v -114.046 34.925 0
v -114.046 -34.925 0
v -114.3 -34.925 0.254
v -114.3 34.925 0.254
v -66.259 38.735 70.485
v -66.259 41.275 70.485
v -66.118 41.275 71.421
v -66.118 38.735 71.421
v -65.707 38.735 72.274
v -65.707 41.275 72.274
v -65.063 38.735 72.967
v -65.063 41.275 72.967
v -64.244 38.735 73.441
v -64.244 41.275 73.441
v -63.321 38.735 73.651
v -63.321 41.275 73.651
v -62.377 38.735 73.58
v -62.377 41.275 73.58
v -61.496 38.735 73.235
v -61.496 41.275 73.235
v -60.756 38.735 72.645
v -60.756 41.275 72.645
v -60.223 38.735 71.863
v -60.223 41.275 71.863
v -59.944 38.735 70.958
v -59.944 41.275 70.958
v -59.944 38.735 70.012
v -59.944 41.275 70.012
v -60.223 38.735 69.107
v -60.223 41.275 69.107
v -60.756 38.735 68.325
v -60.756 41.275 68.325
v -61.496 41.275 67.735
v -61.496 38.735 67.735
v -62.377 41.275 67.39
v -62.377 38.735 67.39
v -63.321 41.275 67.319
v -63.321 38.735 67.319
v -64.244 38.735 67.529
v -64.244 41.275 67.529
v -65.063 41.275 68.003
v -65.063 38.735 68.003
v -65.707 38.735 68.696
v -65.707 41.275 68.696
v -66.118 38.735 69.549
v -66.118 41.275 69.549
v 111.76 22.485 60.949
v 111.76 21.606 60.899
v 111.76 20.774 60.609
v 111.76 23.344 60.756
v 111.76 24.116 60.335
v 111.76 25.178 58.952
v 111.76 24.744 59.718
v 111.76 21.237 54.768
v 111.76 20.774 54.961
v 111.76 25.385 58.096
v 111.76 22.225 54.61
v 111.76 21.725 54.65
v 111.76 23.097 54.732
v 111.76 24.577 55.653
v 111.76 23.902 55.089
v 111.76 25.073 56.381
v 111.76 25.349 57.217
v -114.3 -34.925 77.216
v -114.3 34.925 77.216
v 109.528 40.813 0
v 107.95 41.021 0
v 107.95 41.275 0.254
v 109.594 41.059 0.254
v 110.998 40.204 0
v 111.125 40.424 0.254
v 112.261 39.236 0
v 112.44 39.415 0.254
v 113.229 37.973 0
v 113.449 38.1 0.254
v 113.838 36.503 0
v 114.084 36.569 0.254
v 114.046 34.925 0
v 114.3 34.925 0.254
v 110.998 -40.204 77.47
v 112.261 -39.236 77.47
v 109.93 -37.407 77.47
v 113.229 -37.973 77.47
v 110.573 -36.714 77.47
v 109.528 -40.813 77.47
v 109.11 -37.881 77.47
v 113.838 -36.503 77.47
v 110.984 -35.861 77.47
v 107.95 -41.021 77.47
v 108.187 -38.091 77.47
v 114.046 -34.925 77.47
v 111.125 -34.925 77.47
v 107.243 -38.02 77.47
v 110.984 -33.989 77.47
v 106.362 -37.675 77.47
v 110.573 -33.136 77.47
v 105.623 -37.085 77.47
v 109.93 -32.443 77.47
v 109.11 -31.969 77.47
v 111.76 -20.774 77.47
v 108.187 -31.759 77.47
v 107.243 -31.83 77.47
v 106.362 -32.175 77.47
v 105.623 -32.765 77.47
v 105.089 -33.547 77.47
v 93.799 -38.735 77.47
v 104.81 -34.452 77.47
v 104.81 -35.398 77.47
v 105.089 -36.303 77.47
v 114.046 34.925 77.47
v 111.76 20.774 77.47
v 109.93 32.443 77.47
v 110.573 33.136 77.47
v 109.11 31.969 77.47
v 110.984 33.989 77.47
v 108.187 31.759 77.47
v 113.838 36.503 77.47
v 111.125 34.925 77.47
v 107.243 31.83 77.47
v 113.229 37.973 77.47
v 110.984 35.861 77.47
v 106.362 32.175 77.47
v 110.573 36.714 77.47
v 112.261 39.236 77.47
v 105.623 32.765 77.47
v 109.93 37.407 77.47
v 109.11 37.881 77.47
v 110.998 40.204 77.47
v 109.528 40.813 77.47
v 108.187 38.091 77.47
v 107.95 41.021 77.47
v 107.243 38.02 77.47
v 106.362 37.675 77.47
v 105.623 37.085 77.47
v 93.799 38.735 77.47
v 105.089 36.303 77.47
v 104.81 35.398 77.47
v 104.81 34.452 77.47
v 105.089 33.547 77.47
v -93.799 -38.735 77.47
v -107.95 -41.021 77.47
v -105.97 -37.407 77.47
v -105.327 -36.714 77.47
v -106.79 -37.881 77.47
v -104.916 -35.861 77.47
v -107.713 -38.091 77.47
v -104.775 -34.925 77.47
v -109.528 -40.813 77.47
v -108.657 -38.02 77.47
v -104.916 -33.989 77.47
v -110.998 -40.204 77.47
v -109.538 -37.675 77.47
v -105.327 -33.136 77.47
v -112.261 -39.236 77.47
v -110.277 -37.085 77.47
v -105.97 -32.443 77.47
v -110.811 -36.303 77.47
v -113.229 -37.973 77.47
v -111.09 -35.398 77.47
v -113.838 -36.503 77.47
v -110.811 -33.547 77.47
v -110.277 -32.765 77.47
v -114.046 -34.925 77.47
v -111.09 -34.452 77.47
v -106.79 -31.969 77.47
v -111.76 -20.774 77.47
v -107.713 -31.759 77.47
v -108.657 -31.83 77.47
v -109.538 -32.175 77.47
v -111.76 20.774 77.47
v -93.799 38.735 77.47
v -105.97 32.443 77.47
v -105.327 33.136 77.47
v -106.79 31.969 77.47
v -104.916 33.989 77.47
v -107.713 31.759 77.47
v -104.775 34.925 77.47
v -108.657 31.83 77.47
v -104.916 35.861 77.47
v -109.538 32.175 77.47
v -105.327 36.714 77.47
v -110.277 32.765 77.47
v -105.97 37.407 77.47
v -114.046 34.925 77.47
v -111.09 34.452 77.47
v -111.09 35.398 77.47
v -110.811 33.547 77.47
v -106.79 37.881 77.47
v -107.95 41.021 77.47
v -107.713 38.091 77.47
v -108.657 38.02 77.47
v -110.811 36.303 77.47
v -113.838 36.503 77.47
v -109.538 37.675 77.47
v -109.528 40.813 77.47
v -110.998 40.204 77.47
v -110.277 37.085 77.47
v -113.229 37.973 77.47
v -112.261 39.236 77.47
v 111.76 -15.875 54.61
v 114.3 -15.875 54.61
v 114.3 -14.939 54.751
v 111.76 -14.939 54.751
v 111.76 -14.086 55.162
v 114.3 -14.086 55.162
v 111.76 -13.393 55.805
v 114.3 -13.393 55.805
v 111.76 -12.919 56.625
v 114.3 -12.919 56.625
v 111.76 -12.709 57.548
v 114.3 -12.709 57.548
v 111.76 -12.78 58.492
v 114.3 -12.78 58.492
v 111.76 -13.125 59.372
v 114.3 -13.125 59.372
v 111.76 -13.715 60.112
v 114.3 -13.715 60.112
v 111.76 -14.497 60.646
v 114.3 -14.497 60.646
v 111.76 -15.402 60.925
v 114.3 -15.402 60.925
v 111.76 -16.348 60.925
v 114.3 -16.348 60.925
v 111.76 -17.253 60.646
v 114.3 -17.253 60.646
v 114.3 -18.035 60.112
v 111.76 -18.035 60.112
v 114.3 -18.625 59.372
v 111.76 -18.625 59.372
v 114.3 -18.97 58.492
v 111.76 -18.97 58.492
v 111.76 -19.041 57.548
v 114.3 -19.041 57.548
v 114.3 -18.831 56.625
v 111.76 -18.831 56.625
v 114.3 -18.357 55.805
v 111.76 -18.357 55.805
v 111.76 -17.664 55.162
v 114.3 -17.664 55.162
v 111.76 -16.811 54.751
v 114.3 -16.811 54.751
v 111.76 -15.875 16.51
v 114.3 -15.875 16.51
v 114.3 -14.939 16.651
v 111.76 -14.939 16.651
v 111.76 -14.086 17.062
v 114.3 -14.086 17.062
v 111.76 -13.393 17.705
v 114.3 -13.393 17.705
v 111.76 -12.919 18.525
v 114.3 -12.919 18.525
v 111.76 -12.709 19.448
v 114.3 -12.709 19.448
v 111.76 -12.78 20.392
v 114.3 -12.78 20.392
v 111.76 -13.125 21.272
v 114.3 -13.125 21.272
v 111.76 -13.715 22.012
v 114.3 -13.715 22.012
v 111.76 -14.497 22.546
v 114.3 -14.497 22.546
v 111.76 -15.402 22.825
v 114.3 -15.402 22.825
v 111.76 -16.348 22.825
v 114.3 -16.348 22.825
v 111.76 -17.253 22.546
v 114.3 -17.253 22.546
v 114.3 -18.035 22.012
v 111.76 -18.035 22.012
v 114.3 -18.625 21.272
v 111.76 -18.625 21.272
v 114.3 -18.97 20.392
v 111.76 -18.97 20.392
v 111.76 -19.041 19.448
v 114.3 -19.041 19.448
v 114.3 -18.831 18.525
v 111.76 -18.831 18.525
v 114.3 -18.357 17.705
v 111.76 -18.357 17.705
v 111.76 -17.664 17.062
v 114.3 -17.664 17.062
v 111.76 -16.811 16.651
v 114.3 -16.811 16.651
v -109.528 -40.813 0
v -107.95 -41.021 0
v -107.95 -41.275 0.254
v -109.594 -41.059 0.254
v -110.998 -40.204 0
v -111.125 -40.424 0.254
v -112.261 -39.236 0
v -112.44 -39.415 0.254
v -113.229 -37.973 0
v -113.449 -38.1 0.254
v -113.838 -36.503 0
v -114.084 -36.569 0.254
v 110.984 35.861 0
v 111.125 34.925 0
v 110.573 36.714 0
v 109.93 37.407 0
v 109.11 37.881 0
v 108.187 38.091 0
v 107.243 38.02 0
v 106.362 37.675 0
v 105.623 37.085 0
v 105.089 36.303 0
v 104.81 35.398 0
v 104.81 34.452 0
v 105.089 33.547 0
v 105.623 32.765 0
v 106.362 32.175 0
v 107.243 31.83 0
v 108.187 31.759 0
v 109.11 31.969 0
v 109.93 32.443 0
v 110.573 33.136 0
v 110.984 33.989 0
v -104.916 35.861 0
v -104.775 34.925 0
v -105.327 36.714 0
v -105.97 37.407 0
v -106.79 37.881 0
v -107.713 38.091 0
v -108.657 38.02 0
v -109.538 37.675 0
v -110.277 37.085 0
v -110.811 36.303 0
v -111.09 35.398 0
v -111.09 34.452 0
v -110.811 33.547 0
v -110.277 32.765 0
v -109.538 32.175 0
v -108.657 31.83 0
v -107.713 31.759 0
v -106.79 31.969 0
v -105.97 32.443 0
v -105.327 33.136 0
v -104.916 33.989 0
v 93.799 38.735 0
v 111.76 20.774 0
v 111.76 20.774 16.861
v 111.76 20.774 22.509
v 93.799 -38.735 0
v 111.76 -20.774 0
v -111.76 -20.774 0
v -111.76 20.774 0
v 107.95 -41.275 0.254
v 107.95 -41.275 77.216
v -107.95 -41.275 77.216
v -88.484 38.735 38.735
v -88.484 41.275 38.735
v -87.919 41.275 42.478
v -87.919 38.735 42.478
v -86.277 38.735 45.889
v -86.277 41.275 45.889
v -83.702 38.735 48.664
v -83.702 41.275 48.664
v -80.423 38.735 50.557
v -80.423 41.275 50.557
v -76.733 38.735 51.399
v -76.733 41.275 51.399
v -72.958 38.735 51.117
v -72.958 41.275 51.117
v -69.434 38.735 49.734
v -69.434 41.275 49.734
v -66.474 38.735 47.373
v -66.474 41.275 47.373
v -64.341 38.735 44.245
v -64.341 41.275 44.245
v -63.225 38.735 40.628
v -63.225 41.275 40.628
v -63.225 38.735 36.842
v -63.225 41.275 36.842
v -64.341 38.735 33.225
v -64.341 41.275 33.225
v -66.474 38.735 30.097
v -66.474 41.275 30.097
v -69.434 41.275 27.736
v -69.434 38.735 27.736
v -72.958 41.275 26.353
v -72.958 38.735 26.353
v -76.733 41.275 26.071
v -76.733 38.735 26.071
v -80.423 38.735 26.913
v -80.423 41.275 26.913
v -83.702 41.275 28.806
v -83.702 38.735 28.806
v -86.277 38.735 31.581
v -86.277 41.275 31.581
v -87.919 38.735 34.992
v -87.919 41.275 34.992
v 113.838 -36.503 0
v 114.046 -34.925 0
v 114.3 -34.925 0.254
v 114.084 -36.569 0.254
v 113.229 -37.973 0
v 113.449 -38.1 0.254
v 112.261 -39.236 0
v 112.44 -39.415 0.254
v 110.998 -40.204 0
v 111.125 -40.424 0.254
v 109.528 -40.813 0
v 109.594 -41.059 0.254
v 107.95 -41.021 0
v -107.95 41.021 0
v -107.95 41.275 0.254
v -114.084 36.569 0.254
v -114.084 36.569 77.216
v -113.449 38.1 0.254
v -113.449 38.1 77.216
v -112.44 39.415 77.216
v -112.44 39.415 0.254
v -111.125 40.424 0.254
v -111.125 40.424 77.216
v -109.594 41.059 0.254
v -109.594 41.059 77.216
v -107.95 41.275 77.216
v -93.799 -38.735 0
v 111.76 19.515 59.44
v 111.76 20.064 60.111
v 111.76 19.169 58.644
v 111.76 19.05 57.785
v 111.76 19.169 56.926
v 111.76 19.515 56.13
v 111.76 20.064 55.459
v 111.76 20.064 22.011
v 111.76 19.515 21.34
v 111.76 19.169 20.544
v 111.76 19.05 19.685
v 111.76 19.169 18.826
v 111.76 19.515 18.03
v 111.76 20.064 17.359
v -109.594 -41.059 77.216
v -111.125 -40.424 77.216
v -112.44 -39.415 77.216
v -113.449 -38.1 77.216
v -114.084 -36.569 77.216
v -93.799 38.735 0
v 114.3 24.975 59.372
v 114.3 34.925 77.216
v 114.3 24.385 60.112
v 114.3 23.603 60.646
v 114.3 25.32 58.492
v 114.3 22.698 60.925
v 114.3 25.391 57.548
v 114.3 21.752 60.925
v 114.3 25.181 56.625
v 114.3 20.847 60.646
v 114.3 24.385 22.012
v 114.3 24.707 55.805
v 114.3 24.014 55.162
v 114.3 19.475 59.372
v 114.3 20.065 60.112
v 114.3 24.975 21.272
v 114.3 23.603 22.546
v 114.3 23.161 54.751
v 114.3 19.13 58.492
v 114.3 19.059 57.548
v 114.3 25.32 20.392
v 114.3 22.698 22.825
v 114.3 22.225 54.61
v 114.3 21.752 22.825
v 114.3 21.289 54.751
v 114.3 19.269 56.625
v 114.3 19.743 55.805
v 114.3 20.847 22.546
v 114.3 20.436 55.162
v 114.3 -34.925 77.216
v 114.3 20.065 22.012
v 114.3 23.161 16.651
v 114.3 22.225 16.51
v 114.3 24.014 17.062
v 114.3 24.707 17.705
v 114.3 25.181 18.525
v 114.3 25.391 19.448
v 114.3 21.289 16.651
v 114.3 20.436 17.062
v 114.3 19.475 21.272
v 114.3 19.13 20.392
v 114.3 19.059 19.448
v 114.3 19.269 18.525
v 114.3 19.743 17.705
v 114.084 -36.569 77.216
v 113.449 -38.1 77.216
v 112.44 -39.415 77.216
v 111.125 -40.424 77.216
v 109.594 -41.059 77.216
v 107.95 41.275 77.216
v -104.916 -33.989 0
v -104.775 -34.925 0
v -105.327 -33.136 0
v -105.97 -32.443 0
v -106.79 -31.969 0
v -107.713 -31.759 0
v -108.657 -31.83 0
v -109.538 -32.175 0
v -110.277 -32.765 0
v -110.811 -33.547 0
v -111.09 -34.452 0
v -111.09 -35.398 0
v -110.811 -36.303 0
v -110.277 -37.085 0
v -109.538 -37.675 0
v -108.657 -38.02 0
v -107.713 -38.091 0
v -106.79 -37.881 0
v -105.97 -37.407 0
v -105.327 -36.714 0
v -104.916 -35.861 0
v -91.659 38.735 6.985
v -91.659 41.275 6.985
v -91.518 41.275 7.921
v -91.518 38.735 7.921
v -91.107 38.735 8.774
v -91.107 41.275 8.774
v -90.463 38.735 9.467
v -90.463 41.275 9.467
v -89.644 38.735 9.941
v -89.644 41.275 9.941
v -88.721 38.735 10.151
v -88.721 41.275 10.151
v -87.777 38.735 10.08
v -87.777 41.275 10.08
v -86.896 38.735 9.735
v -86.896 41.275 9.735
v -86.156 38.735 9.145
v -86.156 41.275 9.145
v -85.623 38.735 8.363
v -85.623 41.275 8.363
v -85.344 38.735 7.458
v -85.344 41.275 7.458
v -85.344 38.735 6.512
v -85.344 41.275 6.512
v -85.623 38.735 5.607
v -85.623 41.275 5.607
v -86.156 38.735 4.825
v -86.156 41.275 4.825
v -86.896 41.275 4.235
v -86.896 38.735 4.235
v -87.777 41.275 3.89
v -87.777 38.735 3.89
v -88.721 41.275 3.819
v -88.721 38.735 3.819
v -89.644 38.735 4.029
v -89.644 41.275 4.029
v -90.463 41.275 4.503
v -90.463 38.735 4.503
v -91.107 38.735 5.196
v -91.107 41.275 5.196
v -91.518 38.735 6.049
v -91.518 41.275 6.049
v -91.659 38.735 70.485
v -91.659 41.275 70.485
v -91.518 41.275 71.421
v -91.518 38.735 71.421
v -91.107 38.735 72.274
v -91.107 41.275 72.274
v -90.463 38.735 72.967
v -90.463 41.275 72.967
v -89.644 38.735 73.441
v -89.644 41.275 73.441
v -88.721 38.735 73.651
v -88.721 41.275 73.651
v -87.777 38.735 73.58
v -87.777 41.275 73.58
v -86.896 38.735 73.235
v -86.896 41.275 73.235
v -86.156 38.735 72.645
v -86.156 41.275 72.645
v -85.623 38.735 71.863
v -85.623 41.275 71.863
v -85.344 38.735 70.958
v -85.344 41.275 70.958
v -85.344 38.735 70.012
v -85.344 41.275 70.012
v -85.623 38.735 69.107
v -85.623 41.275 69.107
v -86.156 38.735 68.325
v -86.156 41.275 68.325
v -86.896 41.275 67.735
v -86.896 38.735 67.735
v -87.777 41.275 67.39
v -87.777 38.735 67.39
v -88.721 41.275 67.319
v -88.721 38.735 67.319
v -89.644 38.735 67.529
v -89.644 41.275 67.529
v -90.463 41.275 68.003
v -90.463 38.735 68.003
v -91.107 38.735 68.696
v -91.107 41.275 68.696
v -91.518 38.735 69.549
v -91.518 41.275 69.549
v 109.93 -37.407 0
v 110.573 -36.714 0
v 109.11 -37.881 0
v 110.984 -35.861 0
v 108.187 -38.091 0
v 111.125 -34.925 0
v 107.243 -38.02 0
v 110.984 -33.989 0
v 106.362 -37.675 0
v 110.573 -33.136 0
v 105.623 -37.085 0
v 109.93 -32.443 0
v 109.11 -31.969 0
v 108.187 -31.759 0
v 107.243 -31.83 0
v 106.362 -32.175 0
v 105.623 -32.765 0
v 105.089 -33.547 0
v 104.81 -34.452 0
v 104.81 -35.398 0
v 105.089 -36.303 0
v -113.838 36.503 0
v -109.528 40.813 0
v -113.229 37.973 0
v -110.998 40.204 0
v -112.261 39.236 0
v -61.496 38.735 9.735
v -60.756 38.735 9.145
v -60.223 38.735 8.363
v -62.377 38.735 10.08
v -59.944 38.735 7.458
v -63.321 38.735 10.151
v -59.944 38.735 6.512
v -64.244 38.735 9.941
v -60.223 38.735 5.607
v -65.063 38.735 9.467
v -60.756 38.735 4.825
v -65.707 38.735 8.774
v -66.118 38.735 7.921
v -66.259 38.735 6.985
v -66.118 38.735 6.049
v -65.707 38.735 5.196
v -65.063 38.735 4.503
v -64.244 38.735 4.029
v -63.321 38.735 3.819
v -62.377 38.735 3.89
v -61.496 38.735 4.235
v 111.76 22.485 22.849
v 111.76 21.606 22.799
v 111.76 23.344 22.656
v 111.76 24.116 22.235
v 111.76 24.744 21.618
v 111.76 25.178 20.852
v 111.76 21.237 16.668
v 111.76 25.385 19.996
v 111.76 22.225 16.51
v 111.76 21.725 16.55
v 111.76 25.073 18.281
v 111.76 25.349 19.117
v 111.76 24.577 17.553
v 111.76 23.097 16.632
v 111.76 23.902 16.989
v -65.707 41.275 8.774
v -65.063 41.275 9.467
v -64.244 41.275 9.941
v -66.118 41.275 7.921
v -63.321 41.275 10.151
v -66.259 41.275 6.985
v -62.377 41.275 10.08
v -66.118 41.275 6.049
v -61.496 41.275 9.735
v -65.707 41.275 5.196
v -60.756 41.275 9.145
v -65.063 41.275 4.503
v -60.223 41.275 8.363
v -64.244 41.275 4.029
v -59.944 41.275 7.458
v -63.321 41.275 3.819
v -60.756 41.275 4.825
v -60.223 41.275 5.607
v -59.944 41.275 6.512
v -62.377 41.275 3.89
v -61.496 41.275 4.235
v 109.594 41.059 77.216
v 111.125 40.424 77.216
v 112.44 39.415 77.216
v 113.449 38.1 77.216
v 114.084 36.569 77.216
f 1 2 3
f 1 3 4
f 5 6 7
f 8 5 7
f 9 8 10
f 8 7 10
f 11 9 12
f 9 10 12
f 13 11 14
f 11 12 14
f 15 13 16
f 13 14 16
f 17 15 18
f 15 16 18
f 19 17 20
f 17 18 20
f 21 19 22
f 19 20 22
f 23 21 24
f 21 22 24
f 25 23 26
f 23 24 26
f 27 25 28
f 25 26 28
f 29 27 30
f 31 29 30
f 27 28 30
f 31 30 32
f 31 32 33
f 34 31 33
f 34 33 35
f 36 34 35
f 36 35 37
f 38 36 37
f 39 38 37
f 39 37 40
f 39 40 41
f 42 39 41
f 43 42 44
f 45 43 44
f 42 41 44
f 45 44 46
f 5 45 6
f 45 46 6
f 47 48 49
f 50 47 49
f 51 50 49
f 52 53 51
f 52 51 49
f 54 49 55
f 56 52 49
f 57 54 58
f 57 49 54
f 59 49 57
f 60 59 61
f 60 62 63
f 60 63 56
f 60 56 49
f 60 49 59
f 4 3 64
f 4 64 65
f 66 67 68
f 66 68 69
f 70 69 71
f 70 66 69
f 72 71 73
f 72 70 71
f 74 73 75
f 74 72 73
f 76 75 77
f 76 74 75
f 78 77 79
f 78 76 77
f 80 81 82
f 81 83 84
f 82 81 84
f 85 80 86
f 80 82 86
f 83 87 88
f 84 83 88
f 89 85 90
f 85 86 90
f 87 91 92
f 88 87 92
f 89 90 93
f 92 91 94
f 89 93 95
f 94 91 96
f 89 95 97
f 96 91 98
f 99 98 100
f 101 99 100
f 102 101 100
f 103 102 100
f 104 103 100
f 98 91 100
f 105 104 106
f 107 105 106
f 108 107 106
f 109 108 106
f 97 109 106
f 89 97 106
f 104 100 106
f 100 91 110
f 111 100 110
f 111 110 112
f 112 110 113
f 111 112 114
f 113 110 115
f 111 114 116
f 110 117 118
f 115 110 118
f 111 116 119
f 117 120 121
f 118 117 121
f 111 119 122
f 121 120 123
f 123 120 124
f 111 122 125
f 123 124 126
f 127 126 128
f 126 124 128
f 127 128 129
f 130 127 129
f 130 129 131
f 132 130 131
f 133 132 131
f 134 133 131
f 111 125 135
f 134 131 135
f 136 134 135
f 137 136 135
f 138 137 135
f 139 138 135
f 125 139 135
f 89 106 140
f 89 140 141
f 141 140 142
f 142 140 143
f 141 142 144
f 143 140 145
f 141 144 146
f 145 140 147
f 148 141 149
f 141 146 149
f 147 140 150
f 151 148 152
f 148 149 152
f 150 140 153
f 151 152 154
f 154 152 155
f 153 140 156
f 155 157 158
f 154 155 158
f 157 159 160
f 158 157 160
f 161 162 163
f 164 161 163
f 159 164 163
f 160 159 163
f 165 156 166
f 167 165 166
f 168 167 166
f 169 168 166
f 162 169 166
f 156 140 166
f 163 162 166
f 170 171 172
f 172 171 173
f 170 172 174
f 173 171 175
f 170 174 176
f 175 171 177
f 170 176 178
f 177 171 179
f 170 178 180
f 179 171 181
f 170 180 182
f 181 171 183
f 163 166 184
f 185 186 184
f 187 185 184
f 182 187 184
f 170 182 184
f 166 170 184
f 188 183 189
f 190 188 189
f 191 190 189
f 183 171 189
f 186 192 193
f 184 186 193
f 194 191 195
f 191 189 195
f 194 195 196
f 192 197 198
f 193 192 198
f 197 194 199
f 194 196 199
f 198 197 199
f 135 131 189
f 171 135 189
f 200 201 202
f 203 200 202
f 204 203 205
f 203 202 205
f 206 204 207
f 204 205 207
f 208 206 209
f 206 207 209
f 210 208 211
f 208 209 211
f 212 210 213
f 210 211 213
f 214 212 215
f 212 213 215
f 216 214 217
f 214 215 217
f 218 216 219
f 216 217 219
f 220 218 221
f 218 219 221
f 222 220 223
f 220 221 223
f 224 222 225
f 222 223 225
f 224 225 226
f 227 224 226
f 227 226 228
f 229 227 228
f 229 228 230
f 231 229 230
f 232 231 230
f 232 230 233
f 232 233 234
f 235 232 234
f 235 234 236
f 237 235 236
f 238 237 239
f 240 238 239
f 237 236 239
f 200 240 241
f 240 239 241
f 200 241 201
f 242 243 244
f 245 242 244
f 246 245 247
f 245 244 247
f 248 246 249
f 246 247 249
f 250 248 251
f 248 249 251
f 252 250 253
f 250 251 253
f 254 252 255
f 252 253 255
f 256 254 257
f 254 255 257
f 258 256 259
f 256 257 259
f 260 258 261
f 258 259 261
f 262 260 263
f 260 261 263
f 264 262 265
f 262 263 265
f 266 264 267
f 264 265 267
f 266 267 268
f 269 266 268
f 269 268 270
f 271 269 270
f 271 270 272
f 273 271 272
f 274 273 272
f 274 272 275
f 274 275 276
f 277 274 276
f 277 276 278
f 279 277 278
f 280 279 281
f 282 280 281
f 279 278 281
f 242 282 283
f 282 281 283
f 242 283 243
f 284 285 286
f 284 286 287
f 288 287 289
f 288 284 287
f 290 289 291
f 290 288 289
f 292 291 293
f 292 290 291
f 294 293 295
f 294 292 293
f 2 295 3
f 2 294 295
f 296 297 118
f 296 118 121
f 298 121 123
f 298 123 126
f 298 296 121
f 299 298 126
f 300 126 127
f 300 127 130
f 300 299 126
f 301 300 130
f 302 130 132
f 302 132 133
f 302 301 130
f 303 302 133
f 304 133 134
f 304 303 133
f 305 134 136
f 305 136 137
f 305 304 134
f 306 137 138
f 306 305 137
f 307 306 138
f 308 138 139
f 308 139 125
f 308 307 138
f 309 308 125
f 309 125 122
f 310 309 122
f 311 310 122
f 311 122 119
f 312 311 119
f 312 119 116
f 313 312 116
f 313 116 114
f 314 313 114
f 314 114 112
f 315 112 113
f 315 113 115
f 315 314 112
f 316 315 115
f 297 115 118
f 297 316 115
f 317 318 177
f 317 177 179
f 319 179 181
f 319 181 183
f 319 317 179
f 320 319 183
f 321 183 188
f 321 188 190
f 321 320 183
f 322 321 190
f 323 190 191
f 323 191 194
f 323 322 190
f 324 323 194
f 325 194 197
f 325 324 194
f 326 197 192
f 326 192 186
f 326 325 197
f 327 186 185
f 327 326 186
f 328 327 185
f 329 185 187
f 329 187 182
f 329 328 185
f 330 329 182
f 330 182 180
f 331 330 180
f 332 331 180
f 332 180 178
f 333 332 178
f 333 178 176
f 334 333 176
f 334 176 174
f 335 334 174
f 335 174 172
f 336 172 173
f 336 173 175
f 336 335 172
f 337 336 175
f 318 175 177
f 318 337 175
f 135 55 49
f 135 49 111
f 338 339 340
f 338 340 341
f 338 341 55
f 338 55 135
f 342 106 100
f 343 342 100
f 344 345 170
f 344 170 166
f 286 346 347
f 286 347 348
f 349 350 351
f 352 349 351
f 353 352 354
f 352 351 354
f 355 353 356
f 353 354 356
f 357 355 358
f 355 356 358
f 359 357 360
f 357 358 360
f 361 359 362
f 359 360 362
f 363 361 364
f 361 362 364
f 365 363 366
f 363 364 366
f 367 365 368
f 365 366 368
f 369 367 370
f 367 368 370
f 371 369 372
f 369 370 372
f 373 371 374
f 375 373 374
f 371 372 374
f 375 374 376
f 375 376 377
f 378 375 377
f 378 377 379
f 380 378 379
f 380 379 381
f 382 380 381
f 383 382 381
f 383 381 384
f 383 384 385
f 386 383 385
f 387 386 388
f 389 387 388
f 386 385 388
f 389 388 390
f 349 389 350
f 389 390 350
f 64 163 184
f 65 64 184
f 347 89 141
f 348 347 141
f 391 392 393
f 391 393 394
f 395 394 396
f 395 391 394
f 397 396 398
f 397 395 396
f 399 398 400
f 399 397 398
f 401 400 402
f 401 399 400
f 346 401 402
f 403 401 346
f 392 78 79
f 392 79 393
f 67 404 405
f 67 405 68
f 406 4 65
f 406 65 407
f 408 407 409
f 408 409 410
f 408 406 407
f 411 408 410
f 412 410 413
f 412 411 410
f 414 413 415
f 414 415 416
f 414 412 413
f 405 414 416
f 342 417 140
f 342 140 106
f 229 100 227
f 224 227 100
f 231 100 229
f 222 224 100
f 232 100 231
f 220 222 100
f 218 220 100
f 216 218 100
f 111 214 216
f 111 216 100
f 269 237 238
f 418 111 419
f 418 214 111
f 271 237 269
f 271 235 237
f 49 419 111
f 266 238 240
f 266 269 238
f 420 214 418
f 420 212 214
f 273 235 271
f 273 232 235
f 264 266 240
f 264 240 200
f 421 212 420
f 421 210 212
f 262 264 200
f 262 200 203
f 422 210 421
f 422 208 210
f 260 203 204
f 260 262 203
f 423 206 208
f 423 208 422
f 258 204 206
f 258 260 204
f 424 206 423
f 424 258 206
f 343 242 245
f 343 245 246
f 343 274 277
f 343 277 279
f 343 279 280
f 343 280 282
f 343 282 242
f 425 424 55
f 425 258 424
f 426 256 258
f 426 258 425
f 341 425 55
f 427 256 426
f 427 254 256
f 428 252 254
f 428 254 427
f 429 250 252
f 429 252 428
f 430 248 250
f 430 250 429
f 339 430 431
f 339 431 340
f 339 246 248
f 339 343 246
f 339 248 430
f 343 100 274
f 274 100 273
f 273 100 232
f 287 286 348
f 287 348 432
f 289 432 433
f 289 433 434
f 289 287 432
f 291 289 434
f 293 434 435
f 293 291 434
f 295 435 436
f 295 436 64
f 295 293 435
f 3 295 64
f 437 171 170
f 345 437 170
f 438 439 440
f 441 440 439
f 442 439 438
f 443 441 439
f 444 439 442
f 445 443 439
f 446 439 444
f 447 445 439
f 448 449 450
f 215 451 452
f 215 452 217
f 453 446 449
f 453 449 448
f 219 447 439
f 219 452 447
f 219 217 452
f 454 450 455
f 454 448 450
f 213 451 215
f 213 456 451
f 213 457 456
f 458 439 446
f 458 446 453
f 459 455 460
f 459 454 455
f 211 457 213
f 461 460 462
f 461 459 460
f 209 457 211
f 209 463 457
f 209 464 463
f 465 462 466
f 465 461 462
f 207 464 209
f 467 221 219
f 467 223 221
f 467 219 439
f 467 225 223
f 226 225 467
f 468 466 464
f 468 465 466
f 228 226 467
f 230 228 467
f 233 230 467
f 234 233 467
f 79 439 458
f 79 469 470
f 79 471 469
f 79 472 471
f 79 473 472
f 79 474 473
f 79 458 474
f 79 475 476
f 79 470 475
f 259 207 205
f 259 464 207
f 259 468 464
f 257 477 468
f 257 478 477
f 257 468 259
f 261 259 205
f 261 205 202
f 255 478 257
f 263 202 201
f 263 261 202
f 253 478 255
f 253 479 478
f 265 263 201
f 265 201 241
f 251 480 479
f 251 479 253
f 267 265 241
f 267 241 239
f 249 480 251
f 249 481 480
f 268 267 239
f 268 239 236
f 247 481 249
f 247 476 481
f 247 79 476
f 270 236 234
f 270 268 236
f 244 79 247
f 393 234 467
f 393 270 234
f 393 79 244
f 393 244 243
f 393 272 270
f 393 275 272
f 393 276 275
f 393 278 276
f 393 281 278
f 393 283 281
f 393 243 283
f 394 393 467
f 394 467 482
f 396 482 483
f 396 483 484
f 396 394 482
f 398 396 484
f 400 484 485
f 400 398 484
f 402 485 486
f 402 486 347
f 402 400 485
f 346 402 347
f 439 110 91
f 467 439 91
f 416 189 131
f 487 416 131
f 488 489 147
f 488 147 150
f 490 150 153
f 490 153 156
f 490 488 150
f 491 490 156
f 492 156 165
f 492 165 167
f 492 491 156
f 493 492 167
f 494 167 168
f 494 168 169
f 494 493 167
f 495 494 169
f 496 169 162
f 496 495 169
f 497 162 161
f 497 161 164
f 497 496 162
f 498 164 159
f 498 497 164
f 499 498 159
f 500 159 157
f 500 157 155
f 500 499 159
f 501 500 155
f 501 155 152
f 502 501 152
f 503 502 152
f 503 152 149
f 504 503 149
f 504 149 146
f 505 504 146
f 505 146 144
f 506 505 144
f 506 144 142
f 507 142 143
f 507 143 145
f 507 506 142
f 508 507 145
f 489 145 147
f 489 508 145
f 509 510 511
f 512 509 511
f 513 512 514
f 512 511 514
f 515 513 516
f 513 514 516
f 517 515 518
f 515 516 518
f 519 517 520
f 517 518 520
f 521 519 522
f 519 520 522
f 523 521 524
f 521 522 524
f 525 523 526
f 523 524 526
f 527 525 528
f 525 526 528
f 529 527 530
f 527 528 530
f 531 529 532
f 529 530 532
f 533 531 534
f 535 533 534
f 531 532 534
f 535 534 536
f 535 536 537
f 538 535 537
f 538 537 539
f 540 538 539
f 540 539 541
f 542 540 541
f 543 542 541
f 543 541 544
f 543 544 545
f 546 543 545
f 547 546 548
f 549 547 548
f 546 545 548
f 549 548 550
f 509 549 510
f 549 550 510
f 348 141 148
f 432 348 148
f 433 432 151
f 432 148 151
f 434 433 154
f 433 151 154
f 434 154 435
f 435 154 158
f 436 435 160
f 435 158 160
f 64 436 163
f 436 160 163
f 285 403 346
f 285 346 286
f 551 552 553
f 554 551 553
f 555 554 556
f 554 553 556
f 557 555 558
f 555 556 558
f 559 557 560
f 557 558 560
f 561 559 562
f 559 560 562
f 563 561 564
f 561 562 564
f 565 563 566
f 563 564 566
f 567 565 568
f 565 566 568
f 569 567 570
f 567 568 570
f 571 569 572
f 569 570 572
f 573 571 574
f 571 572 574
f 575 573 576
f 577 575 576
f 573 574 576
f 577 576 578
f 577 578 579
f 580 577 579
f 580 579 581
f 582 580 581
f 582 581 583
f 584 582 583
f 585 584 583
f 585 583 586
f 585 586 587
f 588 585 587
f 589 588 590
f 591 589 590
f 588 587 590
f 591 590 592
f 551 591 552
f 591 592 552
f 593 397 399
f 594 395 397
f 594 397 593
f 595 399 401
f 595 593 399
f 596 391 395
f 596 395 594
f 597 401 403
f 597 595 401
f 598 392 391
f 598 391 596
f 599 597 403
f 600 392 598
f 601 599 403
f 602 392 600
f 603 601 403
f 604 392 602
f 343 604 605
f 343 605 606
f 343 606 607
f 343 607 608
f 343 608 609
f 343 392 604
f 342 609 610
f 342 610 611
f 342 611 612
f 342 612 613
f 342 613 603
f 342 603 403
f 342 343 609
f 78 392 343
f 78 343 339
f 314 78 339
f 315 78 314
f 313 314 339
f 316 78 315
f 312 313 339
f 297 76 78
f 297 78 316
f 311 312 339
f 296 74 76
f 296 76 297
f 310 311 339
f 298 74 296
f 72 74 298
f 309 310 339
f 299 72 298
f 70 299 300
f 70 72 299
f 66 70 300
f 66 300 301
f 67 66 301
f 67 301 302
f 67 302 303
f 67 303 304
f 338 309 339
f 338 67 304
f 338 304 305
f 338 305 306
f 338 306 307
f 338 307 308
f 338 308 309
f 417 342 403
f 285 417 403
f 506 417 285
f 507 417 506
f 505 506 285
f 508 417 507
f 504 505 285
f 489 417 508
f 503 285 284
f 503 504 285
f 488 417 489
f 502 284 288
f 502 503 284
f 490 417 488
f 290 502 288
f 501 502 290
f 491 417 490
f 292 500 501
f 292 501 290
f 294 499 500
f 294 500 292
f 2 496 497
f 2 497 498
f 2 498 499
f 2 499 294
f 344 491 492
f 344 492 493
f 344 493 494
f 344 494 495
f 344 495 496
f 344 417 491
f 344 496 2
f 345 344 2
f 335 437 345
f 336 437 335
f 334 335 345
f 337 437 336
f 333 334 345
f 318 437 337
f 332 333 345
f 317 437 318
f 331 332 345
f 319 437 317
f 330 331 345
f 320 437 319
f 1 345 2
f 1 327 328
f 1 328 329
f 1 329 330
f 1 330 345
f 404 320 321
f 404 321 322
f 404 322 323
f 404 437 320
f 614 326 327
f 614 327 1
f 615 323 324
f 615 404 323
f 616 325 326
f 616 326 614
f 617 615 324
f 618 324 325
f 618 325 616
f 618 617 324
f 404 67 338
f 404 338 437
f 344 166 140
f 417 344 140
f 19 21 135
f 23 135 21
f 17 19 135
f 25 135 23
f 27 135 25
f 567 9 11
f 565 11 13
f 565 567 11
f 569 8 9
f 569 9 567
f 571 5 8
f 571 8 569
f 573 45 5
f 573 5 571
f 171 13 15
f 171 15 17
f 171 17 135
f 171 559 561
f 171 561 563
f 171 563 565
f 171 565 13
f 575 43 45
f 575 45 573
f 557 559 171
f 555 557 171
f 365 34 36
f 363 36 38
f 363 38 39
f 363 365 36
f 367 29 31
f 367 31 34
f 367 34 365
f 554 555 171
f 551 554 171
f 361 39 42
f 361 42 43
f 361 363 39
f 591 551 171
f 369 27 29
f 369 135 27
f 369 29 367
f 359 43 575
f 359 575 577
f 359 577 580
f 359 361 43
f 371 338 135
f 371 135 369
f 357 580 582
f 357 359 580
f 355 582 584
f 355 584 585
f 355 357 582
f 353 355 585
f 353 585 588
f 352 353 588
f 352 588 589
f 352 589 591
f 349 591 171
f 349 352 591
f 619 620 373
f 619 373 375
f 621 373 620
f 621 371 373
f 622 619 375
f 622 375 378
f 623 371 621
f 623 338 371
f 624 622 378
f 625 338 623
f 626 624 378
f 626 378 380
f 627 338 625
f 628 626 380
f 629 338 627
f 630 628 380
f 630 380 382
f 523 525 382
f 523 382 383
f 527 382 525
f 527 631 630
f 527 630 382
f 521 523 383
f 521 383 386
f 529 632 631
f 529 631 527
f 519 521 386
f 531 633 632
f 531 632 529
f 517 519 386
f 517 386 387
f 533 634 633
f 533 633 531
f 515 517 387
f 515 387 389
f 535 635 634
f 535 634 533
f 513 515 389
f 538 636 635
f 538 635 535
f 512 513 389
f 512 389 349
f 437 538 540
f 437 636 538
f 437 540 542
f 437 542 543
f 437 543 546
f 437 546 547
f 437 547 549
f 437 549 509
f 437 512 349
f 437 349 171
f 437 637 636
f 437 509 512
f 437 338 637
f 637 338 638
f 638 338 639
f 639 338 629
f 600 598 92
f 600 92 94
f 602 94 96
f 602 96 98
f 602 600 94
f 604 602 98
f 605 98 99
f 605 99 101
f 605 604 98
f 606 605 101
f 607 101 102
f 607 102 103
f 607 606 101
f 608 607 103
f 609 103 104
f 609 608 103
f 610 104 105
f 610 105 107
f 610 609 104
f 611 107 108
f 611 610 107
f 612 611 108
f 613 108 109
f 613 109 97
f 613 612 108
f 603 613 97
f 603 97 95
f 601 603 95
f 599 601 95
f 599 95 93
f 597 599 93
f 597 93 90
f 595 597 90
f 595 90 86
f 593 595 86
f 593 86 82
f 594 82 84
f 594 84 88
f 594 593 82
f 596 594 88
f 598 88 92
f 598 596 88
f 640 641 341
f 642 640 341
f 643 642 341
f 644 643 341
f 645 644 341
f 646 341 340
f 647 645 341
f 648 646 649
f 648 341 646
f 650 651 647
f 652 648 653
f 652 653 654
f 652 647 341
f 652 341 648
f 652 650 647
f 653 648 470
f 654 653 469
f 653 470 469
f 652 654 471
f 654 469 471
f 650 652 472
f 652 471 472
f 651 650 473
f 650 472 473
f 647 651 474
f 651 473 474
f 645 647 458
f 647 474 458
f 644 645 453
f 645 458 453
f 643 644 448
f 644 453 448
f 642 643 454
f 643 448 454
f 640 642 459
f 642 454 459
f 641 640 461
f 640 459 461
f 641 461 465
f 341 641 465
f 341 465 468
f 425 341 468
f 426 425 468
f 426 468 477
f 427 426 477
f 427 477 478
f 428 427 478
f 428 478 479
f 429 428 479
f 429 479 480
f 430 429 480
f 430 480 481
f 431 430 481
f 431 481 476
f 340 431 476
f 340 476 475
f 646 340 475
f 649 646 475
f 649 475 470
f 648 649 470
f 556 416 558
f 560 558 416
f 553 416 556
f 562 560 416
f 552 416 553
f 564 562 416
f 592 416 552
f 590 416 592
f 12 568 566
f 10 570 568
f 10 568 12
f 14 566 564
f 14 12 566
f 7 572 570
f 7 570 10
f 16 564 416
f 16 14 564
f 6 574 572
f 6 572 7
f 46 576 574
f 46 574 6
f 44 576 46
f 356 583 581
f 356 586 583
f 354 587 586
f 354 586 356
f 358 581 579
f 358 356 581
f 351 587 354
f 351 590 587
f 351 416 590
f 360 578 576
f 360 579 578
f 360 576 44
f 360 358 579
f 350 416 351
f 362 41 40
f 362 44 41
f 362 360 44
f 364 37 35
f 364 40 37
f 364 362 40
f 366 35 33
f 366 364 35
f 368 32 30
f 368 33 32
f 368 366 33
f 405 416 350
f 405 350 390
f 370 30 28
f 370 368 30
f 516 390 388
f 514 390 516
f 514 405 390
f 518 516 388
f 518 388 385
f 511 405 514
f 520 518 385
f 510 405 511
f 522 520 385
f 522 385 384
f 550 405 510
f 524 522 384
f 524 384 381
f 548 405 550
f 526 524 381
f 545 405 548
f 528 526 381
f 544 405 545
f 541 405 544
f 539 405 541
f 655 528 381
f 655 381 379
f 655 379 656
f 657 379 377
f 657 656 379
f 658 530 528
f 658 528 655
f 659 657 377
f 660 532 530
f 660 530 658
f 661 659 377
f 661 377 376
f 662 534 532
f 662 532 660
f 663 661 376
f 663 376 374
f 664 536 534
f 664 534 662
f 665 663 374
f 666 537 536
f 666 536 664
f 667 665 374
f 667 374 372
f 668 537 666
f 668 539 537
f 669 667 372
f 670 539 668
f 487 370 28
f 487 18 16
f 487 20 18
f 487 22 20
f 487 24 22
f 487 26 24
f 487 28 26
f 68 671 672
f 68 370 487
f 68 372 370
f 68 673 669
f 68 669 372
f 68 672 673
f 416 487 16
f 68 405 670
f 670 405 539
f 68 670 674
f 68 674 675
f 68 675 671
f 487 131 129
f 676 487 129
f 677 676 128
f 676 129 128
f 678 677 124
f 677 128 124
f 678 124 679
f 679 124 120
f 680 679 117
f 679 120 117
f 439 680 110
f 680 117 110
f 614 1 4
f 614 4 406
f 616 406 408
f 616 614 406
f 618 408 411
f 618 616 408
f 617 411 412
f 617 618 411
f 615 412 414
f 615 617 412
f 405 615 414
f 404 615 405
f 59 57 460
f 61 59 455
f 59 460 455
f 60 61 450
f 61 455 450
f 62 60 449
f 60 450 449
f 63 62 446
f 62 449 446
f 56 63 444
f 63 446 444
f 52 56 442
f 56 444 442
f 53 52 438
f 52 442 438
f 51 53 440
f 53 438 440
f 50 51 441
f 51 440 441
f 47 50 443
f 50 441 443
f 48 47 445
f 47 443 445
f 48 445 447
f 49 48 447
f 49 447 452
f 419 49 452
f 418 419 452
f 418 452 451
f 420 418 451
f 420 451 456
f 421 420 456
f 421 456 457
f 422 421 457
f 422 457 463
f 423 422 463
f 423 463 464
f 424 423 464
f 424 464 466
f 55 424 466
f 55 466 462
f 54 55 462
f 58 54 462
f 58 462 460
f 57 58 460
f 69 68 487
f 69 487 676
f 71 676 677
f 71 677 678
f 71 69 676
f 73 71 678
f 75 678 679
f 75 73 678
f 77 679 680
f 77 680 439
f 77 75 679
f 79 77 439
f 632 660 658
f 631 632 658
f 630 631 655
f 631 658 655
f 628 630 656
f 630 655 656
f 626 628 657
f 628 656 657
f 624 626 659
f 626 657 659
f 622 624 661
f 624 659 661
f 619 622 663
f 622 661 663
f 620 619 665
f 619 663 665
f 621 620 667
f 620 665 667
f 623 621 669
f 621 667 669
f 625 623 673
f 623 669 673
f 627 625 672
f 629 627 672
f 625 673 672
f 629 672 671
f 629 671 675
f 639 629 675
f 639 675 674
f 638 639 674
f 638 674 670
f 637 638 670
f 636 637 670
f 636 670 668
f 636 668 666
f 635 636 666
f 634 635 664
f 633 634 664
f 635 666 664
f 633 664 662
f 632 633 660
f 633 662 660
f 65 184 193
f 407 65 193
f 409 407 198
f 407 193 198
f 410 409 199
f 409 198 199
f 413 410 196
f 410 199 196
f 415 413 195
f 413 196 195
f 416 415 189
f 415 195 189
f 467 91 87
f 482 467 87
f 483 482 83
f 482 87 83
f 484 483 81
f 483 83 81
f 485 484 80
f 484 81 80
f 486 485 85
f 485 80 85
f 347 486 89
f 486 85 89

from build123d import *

# Parameters (mm, degrees)
SKETCH3_R               = 3.175
SKETCH3_R_2             = 3.429
BOSS_EXTRUDE1_DEPTH     = 77.47
CHAMFER1_SIZE           = 0.254
CUT_EXTRUDE1_DEPTH      = 145.117023717
CUT_EXTRUDE1_DEPTH_BACK = 145.117023717
SKETCH4_R               = 3.175
SKETCH4_R_2             = 3.429
SKETCH5_R               = 3.175
SKETCH5_R_2             = 12.7
CUT_EXTRUDE2_DEPTH      = 2.54
SKETCH6_R               = 3.175
CUT_EXTRUDE3_DEPTH      = 2.54


with BuildPart() as part:
    # Sketch3 → Boss-Extrude1 (new body)
    with BuildSketch(Plane.XY):
        with BuildLine():
            Line((107.95, -41.275), (-107.95, -41.275))
            ThreePointArc((-107.95, -41.275), (-112.440128061, -39.415128061), (-114.3, -34.925))
            Line((-114.3, -34.925), (-114.3, 34.925))
            ThreePointArc((-114.3, 34.925), (-112.440128061, 39.415128061), (-107.95, 41.275))
            Line((-107.95, 41.275), (107.95, 41.275))
            ThreePointArc((107.95, 41.275), (112.440128061, 39.415128061), (114.3, 34.925))
            Line((114.3, 34.925), (114.3, -34.925))
            ThreePointArc((114.3, -34.925), (112.440128061, -39.415128061), (107.95, -41.275))
        make_face()
        with Locations((-107.95, 34.925)):
            Circle(SKETCH3_R, mode=Mode.SUBTRACT)
        with Locations((-107.95, -34.925)):
            Circle(SKETCH3_R, mode=Mode.SUBTRACT)
        with Locations((107.95, -34.925)):
            Circle(SKETCH3_R, mode=Mode.SUBTRACT)
        with Locations((107.95, 34.925)):
            Circle(SKETCH3_R, mode=Mode.SUBTRACT)
        with Locations((-85.598, 0)):
            Circle(SKETCH3_R_2, mode=Mode.SUBTRACT)
        with Locations((85.598, 0)):
            Circle(SKETCH3_R_2, mode=Mode.SUBTRACT)
        with Locations((-15.875, 5.732638889)):
            Circle(SKETCH3_R, mode=Mode.SUBTRACT)
        with Locations((15.875, 5.732638889)):
            Circle(SKETCH3_R, mode=Mode.SUBTRACT)
        with Locations((15.875, -5.732638889)):
            Circle(SKETCH3_R, mode=Mode.SUBTRACT)
        with Locations((-15.875, -5.732638889)):
            Circle(SKETCH3_R, mode=Mode.SUBTRACT)
    extrude(amount=BOSS_EXTRUDE1_DEPTH)

    # Chamfer1
    chamfer1_edges = [part.edges().sort_by_distance(p)[0] for p in [
        (-112.440128061, 39.415128061, 77.47),
        (0, 41.275, 0),
        (112.440128061, 39.415128061, 0),
        (-114.3, 0, 77.47),
        (-112.440128061, -39.415128061, 77.47),
        (0, -41.275, 77.47),
        (112.440128061, -39.415128061, 77.47),
        (114.3, 0, 77.47),
        (112.440128061, 39.415128061, 77.47),
        (0, 41.275, 77.47),
        (114.3, 0, 0),
        (112.440128061, -39.415128061, 0),
        (0, -41.275, 0),
        (-112.440128061, -39.415128061, 0),
        (-114.3, 0, 0),
        (-112.440128061, 39.415128061, 0),
    ]]
    chamfer(chamfer1_edges, length=CHAMFER1_SIZE)

    # Sketch4 → Cut-Extrude1 (cut, two sides: drawn at the far end of the back side and taken through both)
    with BuildSketch(Plane.XY.offset(77.47).offset(-CUT_EXTRUDE1_DEPTH_BACK)):
        Polygon((111.76, 20.774487758), (93.799487758, 38.735), (-93.799487758, 38.735), (-111.76, 20.774487758), (-111.76, -20.774487758), (-93.799487758, -38.735), (93.799487758, -38.735), (111.76, -20.774487758), align=None)
        with Locations((-15.875, -5.732638889)):
            Circle(SKETCH4_R, mode=Mode.SUBTRACT)
        with Locations((15.875, -5.732638889)):
            Circle(SKETCH4_R, mode=Mode.SUBTRACT)
        with Locations((-85.598, 0)):
            Circle(SKETCH4_R_2, mode=Mode.SUBTRACT)
        with Locations((-15.875, 5.732638889)):
            Circle(SKETCH4_R, mode=Mode.SUBTRACT)
        with Locations((15.875, 5.732638889)):
            Circle(SKETCH4_R, mode=Mode.SUBTRACT)
        with Locations((85.598, 0)):
            Circle(SKETCH4_R_2, mode=Mode.SUBTRACT)
    extrude(amount=CUT_EXTRUDE1_DEPTH + CUT_EXTRUDE1_DEPTH_BACK, mode=Mode.SUBTRACT)

    # Sketch5 → Cut-Extrude2 (cut)
    with BuildSketch(Plane(origin=(0, 41.275, 0), x_dir=(1, 0, 0), z_dir=(0, 1, 0))):
        with Locations(Location((-88.483606557, -6.985, 0), (0, 0, 180))):
            Circle(SKETCH5_R)
        with Locations(Location((-63.083606557, -6.985, 0), (0, 0, 180))):
            Circle(SKETCH5_R)
        with Locations(Location((-63.083606557, -70.485, 0), (0, 0, 180))):
            Circle(SKETCH5_R)
        with Locations(Location((-88.483606557, -70.485, 0), (0, 0, 180))):
            Circle(SKETCH5_R)
        with Locations(Location((-75.783606557, -38.735, 0), (0, 0, 180))):
            Circle(SKETCH5_R_2)
    extrude(amount=-CUT_EXTRUDE2_DEPTH, mode=Mode.SUBTRACT)

    # Sketch6 → Cut-Extrude3 (cut)
    with BuildSketch(Plane(origin=(114.3, 0, 0), x_dir=(0, 0, -1), z_dir=(1, 0, 0))):
        with Locations((-57.785, 22.225)):
            Circle(SKETCH6_R)
        with Locations((-19.685, 22.225)):
            Circle(SKETCH6_R)
        with Locations((-19.685, -15.875)):
            Circle(SKETCH6_R)
        with Locations((-57.785, -15.875)):
            Circle(SKETCH6_R)
    extrude(amount=-CUT_EXTRUDE3_DEPTH, mode=Mode.SUBTRACT)


solid = part.part
